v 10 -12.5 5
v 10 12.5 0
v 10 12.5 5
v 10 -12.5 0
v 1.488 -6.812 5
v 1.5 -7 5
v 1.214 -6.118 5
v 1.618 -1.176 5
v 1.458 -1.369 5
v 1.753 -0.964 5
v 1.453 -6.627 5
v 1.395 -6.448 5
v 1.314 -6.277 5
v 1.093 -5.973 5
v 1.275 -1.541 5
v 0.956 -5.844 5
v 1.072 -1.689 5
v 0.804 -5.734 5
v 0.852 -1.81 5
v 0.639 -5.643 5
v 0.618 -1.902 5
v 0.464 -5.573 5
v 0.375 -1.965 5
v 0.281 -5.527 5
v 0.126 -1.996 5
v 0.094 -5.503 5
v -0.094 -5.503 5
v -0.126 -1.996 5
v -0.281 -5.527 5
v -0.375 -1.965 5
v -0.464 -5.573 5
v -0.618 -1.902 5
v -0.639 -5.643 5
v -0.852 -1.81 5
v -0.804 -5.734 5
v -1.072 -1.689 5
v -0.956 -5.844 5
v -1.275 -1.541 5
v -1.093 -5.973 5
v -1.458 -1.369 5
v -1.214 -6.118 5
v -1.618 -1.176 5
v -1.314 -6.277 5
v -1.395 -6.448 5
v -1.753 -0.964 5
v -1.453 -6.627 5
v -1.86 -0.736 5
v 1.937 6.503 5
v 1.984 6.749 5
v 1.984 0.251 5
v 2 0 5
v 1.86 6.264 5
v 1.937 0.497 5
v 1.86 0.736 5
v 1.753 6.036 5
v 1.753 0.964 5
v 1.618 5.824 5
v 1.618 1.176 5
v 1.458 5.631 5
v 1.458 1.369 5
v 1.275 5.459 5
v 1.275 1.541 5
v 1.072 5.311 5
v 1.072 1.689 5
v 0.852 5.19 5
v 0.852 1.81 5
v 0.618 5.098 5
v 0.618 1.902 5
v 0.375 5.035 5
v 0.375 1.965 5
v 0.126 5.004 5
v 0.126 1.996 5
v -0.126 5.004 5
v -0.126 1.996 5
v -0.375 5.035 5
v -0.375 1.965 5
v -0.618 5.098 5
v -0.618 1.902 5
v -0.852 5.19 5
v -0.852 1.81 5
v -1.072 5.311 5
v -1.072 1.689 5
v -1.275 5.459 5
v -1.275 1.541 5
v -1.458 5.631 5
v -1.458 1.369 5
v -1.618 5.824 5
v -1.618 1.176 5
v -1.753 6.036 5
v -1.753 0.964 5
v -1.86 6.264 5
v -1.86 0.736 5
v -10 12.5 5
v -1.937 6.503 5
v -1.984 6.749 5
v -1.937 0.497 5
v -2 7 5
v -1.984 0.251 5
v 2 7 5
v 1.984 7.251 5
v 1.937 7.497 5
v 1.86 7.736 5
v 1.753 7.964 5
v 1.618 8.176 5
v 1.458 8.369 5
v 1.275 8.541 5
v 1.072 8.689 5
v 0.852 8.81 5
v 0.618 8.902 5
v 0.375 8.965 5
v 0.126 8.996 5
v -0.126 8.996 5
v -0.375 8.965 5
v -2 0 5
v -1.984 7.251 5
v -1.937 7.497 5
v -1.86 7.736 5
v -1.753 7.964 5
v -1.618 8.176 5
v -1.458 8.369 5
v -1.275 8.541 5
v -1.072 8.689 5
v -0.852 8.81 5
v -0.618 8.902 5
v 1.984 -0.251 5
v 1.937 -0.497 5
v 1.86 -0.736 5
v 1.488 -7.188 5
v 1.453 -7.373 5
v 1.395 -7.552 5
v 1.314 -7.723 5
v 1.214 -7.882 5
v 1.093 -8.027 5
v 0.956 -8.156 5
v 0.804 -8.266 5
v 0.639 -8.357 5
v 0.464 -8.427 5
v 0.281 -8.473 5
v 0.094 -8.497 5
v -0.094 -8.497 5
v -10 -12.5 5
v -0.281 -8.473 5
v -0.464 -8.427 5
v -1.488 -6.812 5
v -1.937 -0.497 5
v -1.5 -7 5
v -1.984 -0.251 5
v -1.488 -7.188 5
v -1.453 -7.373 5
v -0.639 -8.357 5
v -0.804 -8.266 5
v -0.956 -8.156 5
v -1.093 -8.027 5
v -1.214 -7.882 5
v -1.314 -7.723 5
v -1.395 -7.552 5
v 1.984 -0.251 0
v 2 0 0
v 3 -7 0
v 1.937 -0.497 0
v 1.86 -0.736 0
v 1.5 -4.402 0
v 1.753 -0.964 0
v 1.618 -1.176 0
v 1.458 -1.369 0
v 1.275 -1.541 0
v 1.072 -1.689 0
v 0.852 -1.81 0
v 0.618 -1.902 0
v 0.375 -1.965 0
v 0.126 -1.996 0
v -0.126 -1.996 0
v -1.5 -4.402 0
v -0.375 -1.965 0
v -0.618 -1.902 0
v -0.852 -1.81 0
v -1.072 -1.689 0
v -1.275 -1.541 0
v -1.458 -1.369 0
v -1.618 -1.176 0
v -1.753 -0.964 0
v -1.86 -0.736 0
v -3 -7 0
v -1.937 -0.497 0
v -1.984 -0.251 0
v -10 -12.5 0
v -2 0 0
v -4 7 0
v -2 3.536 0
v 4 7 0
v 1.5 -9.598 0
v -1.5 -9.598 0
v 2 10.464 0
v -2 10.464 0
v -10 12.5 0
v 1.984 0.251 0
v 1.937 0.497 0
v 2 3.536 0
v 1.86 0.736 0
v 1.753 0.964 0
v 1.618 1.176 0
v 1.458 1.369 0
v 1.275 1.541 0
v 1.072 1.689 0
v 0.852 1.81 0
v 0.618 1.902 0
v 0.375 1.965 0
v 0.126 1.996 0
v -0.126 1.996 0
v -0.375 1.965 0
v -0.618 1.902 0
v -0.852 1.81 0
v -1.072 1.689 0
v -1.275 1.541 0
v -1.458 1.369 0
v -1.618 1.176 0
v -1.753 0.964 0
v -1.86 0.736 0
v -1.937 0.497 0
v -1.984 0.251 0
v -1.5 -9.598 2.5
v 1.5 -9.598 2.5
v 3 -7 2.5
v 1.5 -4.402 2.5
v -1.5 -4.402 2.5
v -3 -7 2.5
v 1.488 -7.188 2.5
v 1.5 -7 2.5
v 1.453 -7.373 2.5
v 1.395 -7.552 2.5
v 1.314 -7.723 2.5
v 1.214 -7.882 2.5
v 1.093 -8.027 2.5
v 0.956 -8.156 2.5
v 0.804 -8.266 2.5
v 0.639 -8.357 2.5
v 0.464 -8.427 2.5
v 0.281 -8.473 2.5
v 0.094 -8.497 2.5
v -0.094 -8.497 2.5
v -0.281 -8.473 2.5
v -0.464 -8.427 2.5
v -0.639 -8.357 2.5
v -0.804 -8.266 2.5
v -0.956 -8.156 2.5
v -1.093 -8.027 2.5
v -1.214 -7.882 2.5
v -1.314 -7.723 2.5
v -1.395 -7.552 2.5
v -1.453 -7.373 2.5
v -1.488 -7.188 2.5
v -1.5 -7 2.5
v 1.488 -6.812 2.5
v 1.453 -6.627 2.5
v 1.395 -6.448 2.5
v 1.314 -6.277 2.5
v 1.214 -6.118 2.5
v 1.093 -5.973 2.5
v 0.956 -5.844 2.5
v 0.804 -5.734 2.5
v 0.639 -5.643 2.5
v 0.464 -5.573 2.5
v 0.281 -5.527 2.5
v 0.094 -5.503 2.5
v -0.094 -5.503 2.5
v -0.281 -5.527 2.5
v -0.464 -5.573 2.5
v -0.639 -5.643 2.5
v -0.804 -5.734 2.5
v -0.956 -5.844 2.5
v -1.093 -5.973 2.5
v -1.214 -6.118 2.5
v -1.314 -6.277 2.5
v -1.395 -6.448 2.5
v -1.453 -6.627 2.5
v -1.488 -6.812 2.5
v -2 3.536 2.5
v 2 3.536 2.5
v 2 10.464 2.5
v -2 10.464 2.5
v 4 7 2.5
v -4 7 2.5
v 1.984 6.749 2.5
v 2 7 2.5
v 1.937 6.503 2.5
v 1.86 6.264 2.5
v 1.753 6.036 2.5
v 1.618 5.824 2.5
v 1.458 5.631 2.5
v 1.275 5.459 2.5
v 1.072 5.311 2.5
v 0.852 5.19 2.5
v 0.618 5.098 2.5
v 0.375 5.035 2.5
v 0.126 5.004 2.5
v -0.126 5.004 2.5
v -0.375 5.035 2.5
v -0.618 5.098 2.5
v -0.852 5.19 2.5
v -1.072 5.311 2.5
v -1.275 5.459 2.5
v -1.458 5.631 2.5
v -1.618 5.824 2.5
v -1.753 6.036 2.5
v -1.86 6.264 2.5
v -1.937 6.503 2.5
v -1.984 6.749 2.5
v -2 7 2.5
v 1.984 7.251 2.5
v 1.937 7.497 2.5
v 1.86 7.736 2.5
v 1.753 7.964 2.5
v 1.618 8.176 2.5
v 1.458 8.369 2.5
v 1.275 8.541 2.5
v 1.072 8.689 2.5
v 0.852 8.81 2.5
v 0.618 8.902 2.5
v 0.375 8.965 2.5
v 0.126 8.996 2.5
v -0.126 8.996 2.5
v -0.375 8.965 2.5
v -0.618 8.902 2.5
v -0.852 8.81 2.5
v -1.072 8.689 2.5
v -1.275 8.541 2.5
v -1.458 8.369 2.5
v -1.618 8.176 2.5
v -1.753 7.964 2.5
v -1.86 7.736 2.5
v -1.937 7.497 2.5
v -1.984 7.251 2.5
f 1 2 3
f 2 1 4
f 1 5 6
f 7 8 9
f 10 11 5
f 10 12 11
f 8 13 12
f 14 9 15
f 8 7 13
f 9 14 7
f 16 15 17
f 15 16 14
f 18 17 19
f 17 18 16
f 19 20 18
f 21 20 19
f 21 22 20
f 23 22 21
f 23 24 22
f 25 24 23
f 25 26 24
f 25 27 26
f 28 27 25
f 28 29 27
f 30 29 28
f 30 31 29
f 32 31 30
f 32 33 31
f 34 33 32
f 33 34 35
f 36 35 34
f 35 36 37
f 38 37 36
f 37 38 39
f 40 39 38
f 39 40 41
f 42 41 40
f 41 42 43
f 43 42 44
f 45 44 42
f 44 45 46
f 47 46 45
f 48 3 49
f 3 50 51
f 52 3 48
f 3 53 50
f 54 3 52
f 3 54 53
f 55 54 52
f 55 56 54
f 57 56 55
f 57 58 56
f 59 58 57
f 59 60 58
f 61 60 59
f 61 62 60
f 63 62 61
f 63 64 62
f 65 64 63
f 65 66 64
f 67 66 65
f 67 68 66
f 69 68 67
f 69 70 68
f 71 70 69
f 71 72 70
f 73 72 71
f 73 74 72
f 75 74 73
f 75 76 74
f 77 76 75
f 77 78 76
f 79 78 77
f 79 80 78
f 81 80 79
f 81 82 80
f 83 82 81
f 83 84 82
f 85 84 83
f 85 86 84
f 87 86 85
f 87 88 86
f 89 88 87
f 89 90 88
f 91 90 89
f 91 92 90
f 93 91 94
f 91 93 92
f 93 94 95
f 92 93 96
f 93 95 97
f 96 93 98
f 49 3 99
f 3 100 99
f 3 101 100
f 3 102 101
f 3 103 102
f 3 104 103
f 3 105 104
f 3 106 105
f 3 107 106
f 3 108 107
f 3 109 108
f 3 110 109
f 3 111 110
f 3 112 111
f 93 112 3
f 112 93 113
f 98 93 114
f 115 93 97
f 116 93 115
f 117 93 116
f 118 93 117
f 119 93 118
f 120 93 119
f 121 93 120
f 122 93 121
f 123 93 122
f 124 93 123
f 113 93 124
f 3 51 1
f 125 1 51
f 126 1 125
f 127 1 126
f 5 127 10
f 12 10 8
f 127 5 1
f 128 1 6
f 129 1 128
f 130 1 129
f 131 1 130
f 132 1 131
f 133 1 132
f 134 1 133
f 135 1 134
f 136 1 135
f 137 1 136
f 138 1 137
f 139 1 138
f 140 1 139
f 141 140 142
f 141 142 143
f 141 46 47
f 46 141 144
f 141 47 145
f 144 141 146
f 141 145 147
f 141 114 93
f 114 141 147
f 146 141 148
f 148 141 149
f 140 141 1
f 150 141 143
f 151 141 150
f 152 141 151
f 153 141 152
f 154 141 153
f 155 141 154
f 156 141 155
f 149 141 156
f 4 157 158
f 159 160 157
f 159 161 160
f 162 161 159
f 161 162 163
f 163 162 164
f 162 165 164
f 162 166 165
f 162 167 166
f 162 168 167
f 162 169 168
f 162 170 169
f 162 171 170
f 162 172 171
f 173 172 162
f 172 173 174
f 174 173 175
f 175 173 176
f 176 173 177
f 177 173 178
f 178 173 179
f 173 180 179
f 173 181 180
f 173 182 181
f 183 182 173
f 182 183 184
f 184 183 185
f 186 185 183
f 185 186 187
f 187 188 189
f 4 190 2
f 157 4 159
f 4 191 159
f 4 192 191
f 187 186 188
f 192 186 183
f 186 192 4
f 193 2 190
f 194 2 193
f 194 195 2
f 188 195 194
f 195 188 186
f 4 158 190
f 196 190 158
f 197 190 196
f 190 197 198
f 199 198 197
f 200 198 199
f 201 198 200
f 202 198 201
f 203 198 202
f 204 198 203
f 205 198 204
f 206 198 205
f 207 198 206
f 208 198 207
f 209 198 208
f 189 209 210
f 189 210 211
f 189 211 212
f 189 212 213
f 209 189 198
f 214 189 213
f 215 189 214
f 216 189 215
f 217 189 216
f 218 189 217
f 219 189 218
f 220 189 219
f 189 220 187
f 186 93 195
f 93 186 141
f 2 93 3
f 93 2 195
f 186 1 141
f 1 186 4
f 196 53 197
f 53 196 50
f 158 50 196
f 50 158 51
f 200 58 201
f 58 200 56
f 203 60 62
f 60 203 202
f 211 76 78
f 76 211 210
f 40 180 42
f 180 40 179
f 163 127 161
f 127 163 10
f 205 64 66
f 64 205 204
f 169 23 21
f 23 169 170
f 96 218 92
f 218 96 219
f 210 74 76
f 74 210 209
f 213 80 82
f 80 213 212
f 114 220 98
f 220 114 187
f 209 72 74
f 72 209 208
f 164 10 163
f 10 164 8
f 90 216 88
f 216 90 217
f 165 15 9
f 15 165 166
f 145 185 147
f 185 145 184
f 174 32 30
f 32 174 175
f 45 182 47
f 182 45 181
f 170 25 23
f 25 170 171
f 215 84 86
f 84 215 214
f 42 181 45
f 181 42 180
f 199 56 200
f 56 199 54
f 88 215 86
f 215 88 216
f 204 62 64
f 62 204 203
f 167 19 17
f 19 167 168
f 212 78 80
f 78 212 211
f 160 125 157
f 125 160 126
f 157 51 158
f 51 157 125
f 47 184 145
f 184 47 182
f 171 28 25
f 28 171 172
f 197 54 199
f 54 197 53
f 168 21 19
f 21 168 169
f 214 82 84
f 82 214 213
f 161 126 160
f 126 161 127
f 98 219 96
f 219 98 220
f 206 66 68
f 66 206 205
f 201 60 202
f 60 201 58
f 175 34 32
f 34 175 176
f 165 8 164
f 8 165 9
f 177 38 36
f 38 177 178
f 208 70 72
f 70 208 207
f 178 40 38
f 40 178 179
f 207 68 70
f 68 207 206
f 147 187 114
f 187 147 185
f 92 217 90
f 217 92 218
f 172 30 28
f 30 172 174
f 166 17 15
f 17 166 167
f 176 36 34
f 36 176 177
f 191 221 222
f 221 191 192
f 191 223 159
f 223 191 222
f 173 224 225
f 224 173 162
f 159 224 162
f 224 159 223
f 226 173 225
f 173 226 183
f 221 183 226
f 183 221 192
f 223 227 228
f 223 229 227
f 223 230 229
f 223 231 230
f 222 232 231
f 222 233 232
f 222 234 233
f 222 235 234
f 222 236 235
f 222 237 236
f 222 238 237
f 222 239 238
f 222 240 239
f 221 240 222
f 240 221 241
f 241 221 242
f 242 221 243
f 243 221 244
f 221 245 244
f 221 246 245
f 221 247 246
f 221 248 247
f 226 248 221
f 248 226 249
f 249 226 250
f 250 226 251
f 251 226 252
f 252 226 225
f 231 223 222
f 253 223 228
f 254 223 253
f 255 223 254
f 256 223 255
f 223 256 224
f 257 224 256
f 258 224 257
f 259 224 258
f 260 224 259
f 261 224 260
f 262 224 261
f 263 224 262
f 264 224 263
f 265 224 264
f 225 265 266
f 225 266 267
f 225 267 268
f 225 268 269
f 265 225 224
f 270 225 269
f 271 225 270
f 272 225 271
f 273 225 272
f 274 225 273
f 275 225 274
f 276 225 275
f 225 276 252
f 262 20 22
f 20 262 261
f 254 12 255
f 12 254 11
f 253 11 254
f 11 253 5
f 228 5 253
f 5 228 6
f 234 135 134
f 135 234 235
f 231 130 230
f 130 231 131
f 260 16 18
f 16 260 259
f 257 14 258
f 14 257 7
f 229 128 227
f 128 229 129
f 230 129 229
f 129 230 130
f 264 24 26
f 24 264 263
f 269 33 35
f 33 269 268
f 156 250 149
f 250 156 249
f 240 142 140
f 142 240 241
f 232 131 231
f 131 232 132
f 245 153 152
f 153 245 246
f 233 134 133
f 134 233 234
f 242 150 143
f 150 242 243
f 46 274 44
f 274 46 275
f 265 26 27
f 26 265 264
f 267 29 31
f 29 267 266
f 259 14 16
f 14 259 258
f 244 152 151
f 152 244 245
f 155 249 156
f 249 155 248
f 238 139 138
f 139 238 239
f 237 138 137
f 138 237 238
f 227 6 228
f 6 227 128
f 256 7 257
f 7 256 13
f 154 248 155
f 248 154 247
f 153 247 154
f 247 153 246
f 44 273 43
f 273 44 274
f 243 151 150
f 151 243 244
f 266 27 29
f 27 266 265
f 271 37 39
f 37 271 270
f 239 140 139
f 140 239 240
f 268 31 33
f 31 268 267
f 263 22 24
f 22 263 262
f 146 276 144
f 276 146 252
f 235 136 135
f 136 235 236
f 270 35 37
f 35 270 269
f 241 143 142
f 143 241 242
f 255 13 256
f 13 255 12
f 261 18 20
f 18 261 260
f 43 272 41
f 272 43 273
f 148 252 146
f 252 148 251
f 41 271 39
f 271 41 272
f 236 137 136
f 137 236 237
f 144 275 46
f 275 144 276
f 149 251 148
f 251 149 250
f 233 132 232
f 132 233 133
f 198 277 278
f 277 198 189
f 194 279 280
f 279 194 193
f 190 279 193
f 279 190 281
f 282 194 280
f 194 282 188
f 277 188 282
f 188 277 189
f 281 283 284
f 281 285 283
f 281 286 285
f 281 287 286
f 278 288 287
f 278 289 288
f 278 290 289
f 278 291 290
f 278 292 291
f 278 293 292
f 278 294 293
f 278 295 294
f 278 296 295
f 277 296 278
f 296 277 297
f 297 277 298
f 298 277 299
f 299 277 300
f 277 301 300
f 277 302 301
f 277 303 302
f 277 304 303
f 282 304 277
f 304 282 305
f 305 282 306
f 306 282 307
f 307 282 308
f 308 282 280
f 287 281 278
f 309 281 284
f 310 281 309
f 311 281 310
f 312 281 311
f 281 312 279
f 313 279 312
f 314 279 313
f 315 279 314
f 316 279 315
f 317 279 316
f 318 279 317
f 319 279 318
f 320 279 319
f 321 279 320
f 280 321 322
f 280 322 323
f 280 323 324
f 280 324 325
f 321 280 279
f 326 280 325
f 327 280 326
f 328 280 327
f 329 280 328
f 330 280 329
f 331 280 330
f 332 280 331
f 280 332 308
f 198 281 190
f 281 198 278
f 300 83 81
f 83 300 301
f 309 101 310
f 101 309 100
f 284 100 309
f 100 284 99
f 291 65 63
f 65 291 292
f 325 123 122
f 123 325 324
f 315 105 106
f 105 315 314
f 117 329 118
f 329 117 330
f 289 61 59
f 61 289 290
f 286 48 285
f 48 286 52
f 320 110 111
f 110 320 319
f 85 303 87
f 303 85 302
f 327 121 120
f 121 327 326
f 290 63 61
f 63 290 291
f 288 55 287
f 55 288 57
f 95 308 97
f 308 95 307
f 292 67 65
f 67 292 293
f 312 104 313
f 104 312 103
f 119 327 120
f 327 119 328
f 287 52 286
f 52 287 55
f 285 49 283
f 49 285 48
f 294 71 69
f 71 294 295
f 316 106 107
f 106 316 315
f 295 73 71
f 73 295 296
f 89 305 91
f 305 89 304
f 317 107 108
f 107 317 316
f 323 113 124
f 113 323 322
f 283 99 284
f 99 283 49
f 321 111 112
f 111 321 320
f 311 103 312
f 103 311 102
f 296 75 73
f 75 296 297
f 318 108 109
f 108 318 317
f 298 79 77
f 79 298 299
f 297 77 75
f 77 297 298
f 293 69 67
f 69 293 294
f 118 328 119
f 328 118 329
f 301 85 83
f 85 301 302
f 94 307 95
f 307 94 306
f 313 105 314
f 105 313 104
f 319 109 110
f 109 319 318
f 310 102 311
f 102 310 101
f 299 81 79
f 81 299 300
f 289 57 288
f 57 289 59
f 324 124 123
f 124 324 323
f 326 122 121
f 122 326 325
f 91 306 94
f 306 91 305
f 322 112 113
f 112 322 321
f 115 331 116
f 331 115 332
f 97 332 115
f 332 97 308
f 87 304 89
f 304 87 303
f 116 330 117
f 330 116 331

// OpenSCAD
WIDTH = 20;
LENGTH = 25;
THICKNESS = 5;

CENTER_HOLE_DIA = 4;

HOLE_OFFSET = 7;

TOP_HOLE_DIA = 4;
TOP_HOLE_HEAD_DIA = 8;

BOTTOM_HOLE_DIA = 3;
BOTTOM_HOLE_HEAD_DIA = 6;

$fn = 50;

difference() {
  translate([0, 0, THICKNESS/2])
  cube([WIDTH, LENGTH, THICKNESS], center = true);

  cylinder(d = CENTER_HOLE_DIA, h = THICKNESS);

  translate([0, -HOLE_OFFSET, 0])
  cylinder(d = BOTTOM_HOLE_HEAD_DIA, h = THICKNESS/2, $fn = 6);

  translate([0, -HOLE_OFFSET, 0])
  cylinder(d = BOTTOM_HOLE_DIA, h = THICKNESS);

  translate([0, HOLE_OFFSET, 0])
  cylinder(d = TOP_HOLE_HEAD_DIA, h = THICKNESS/2, $fn = 6);

  translate([0, HOLE_OFFSET, 0])
  cylinder(d = TOP_HOLE_DIA, h = THICKNESS);
}
